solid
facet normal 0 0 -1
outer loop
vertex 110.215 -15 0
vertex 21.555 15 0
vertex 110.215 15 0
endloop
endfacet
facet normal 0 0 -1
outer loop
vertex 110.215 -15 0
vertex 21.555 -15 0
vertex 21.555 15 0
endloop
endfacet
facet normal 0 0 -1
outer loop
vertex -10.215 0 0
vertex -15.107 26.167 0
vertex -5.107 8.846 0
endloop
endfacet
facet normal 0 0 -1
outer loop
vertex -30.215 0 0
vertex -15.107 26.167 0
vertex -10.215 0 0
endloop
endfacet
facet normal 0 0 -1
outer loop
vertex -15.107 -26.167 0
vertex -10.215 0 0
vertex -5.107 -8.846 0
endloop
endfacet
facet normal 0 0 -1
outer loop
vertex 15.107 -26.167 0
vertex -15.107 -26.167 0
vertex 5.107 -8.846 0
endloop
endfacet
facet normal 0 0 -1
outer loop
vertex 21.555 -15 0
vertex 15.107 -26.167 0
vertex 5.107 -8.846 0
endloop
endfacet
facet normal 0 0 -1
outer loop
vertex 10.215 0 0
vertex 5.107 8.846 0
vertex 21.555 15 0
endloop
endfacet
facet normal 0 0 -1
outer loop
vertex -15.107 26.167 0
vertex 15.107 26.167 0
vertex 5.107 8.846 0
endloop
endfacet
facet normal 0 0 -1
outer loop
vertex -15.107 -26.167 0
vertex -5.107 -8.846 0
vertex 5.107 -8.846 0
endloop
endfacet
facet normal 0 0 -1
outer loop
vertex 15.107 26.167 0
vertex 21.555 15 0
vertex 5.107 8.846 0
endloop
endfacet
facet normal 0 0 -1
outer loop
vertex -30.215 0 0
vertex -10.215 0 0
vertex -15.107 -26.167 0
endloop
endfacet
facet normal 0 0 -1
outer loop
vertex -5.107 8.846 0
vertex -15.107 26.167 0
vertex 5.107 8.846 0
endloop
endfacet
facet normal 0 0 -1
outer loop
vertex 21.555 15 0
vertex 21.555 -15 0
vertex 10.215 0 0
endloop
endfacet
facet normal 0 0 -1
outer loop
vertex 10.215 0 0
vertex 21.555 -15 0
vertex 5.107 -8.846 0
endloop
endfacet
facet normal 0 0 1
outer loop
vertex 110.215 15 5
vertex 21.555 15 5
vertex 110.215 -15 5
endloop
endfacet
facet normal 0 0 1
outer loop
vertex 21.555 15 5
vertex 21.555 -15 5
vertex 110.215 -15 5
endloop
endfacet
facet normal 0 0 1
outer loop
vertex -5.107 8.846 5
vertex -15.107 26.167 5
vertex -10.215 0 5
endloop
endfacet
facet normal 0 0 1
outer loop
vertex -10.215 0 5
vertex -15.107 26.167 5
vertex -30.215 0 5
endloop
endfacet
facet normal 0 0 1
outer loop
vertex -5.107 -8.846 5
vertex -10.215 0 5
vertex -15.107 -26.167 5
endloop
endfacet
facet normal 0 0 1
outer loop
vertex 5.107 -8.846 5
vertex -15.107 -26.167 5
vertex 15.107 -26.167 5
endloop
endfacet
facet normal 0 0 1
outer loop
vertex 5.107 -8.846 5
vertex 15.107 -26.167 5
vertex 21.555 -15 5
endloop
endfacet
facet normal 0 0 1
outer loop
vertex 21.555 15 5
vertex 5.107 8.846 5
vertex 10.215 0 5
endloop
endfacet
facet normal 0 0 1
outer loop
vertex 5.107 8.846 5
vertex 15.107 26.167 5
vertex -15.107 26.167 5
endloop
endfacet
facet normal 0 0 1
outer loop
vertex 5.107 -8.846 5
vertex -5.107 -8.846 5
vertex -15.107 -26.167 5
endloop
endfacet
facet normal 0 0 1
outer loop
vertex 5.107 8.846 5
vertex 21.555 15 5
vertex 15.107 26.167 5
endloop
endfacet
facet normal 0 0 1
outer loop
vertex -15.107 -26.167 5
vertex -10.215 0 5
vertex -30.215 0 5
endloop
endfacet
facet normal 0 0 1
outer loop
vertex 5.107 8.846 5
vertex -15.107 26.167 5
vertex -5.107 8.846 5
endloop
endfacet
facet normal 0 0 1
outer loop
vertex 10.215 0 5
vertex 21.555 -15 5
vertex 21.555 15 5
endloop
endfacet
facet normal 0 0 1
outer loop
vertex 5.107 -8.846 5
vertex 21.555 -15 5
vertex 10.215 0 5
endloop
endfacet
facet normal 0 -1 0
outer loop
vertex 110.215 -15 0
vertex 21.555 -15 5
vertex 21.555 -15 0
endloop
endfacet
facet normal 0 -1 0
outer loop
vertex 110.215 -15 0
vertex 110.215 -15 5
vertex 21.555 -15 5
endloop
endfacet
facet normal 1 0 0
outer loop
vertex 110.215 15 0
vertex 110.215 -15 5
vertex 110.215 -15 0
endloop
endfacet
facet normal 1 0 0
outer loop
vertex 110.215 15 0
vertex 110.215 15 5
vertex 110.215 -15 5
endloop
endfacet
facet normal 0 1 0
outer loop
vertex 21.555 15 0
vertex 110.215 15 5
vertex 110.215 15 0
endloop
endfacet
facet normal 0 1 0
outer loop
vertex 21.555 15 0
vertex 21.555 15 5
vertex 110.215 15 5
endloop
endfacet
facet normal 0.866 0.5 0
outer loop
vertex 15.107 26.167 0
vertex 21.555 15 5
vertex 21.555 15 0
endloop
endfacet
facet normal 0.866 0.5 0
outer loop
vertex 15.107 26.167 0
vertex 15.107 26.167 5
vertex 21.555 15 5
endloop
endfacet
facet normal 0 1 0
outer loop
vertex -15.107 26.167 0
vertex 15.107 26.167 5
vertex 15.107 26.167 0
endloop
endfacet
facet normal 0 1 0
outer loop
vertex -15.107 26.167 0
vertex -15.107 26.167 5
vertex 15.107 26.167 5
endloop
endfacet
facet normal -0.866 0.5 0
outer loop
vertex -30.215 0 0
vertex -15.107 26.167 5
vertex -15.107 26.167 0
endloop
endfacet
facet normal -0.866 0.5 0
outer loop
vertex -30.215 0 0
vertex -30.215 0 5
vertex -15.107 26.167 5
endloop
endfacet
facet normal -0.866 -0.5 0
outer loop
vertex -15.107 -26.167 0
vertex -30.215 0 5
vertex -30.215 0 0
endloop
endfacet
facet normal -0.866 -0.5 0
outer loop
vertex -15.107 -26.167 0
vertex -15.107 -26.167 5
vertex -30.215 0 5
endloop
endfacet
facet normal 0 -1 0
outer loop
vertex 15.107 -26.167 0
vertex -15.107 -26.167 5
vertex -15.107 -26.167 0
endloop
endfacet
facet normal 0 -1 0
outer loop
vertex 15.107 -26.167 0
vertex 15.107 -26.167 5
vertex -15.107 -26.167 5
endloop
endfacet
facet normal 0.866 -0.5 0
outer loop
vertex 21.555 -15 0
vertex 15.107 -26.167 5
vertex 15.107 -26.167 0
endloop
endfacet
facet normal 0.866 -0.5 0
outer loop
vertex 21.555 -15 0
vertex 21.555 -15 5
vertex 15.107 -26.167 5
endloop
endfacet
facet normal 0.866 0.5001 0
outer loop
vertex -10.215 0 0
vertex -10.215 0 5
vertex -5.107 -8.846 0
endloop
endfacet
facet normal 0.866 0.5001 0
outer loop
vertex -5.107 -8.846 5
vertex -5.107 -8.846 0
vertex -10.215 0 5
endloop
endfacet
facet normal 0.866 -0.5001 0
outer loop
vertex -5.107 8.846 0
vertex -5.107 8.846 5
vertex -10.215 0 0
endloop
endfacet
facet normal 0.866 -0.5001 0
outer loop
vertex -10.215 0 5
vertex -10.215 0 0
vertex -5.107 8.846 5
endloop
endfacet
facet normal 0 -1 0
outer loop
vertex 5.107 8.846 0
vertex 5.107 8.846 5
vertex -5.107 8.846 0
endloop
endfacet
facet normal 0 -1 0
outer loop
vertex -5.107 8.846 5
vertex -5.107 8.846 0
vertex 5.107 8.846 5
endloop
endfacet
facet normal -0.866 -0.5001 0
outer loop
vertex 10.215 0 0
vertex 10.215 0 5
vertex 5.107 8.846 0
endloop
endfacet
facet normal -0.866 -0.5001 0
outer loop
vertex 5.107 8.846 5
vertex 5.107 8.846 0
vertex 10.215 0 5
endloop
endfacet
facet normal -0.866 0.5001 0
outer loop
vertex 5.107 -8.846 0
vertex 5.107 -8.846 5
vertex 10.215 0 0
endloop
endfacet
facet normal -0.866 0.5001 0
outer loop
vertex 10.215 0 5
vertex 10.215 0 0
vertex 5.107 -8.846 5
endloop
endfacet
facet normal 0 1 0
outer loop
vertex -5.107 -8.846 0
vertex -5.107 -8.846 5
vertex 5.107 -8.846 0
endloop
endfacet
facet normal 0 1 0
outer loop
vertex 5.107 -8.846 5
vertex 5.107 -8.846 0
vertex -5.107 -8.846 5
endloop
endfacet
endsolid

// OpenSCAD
t = 20;

diam = 17;
rad = diam/2;
tol = 0.4;
inner_r = rad * 2 / sqrt(3) + tol;
outer_r = inner_r + t;

grip_r = 5;

linear_extrude(height=5){
union(){
    difference(){
        circle(outer_r, $fn=6);
        circle(inner_r, $fn=6);
    }
    //for(i = [0:6]){
    //    translate([outer_r * cos(i * 60), outer_r * sin(i * 60)])
    //        circle(grip_r);
    //}
    translate([100/2 + inner_r, 0]){
        square([100, 30], center=true);
    }
}
}
